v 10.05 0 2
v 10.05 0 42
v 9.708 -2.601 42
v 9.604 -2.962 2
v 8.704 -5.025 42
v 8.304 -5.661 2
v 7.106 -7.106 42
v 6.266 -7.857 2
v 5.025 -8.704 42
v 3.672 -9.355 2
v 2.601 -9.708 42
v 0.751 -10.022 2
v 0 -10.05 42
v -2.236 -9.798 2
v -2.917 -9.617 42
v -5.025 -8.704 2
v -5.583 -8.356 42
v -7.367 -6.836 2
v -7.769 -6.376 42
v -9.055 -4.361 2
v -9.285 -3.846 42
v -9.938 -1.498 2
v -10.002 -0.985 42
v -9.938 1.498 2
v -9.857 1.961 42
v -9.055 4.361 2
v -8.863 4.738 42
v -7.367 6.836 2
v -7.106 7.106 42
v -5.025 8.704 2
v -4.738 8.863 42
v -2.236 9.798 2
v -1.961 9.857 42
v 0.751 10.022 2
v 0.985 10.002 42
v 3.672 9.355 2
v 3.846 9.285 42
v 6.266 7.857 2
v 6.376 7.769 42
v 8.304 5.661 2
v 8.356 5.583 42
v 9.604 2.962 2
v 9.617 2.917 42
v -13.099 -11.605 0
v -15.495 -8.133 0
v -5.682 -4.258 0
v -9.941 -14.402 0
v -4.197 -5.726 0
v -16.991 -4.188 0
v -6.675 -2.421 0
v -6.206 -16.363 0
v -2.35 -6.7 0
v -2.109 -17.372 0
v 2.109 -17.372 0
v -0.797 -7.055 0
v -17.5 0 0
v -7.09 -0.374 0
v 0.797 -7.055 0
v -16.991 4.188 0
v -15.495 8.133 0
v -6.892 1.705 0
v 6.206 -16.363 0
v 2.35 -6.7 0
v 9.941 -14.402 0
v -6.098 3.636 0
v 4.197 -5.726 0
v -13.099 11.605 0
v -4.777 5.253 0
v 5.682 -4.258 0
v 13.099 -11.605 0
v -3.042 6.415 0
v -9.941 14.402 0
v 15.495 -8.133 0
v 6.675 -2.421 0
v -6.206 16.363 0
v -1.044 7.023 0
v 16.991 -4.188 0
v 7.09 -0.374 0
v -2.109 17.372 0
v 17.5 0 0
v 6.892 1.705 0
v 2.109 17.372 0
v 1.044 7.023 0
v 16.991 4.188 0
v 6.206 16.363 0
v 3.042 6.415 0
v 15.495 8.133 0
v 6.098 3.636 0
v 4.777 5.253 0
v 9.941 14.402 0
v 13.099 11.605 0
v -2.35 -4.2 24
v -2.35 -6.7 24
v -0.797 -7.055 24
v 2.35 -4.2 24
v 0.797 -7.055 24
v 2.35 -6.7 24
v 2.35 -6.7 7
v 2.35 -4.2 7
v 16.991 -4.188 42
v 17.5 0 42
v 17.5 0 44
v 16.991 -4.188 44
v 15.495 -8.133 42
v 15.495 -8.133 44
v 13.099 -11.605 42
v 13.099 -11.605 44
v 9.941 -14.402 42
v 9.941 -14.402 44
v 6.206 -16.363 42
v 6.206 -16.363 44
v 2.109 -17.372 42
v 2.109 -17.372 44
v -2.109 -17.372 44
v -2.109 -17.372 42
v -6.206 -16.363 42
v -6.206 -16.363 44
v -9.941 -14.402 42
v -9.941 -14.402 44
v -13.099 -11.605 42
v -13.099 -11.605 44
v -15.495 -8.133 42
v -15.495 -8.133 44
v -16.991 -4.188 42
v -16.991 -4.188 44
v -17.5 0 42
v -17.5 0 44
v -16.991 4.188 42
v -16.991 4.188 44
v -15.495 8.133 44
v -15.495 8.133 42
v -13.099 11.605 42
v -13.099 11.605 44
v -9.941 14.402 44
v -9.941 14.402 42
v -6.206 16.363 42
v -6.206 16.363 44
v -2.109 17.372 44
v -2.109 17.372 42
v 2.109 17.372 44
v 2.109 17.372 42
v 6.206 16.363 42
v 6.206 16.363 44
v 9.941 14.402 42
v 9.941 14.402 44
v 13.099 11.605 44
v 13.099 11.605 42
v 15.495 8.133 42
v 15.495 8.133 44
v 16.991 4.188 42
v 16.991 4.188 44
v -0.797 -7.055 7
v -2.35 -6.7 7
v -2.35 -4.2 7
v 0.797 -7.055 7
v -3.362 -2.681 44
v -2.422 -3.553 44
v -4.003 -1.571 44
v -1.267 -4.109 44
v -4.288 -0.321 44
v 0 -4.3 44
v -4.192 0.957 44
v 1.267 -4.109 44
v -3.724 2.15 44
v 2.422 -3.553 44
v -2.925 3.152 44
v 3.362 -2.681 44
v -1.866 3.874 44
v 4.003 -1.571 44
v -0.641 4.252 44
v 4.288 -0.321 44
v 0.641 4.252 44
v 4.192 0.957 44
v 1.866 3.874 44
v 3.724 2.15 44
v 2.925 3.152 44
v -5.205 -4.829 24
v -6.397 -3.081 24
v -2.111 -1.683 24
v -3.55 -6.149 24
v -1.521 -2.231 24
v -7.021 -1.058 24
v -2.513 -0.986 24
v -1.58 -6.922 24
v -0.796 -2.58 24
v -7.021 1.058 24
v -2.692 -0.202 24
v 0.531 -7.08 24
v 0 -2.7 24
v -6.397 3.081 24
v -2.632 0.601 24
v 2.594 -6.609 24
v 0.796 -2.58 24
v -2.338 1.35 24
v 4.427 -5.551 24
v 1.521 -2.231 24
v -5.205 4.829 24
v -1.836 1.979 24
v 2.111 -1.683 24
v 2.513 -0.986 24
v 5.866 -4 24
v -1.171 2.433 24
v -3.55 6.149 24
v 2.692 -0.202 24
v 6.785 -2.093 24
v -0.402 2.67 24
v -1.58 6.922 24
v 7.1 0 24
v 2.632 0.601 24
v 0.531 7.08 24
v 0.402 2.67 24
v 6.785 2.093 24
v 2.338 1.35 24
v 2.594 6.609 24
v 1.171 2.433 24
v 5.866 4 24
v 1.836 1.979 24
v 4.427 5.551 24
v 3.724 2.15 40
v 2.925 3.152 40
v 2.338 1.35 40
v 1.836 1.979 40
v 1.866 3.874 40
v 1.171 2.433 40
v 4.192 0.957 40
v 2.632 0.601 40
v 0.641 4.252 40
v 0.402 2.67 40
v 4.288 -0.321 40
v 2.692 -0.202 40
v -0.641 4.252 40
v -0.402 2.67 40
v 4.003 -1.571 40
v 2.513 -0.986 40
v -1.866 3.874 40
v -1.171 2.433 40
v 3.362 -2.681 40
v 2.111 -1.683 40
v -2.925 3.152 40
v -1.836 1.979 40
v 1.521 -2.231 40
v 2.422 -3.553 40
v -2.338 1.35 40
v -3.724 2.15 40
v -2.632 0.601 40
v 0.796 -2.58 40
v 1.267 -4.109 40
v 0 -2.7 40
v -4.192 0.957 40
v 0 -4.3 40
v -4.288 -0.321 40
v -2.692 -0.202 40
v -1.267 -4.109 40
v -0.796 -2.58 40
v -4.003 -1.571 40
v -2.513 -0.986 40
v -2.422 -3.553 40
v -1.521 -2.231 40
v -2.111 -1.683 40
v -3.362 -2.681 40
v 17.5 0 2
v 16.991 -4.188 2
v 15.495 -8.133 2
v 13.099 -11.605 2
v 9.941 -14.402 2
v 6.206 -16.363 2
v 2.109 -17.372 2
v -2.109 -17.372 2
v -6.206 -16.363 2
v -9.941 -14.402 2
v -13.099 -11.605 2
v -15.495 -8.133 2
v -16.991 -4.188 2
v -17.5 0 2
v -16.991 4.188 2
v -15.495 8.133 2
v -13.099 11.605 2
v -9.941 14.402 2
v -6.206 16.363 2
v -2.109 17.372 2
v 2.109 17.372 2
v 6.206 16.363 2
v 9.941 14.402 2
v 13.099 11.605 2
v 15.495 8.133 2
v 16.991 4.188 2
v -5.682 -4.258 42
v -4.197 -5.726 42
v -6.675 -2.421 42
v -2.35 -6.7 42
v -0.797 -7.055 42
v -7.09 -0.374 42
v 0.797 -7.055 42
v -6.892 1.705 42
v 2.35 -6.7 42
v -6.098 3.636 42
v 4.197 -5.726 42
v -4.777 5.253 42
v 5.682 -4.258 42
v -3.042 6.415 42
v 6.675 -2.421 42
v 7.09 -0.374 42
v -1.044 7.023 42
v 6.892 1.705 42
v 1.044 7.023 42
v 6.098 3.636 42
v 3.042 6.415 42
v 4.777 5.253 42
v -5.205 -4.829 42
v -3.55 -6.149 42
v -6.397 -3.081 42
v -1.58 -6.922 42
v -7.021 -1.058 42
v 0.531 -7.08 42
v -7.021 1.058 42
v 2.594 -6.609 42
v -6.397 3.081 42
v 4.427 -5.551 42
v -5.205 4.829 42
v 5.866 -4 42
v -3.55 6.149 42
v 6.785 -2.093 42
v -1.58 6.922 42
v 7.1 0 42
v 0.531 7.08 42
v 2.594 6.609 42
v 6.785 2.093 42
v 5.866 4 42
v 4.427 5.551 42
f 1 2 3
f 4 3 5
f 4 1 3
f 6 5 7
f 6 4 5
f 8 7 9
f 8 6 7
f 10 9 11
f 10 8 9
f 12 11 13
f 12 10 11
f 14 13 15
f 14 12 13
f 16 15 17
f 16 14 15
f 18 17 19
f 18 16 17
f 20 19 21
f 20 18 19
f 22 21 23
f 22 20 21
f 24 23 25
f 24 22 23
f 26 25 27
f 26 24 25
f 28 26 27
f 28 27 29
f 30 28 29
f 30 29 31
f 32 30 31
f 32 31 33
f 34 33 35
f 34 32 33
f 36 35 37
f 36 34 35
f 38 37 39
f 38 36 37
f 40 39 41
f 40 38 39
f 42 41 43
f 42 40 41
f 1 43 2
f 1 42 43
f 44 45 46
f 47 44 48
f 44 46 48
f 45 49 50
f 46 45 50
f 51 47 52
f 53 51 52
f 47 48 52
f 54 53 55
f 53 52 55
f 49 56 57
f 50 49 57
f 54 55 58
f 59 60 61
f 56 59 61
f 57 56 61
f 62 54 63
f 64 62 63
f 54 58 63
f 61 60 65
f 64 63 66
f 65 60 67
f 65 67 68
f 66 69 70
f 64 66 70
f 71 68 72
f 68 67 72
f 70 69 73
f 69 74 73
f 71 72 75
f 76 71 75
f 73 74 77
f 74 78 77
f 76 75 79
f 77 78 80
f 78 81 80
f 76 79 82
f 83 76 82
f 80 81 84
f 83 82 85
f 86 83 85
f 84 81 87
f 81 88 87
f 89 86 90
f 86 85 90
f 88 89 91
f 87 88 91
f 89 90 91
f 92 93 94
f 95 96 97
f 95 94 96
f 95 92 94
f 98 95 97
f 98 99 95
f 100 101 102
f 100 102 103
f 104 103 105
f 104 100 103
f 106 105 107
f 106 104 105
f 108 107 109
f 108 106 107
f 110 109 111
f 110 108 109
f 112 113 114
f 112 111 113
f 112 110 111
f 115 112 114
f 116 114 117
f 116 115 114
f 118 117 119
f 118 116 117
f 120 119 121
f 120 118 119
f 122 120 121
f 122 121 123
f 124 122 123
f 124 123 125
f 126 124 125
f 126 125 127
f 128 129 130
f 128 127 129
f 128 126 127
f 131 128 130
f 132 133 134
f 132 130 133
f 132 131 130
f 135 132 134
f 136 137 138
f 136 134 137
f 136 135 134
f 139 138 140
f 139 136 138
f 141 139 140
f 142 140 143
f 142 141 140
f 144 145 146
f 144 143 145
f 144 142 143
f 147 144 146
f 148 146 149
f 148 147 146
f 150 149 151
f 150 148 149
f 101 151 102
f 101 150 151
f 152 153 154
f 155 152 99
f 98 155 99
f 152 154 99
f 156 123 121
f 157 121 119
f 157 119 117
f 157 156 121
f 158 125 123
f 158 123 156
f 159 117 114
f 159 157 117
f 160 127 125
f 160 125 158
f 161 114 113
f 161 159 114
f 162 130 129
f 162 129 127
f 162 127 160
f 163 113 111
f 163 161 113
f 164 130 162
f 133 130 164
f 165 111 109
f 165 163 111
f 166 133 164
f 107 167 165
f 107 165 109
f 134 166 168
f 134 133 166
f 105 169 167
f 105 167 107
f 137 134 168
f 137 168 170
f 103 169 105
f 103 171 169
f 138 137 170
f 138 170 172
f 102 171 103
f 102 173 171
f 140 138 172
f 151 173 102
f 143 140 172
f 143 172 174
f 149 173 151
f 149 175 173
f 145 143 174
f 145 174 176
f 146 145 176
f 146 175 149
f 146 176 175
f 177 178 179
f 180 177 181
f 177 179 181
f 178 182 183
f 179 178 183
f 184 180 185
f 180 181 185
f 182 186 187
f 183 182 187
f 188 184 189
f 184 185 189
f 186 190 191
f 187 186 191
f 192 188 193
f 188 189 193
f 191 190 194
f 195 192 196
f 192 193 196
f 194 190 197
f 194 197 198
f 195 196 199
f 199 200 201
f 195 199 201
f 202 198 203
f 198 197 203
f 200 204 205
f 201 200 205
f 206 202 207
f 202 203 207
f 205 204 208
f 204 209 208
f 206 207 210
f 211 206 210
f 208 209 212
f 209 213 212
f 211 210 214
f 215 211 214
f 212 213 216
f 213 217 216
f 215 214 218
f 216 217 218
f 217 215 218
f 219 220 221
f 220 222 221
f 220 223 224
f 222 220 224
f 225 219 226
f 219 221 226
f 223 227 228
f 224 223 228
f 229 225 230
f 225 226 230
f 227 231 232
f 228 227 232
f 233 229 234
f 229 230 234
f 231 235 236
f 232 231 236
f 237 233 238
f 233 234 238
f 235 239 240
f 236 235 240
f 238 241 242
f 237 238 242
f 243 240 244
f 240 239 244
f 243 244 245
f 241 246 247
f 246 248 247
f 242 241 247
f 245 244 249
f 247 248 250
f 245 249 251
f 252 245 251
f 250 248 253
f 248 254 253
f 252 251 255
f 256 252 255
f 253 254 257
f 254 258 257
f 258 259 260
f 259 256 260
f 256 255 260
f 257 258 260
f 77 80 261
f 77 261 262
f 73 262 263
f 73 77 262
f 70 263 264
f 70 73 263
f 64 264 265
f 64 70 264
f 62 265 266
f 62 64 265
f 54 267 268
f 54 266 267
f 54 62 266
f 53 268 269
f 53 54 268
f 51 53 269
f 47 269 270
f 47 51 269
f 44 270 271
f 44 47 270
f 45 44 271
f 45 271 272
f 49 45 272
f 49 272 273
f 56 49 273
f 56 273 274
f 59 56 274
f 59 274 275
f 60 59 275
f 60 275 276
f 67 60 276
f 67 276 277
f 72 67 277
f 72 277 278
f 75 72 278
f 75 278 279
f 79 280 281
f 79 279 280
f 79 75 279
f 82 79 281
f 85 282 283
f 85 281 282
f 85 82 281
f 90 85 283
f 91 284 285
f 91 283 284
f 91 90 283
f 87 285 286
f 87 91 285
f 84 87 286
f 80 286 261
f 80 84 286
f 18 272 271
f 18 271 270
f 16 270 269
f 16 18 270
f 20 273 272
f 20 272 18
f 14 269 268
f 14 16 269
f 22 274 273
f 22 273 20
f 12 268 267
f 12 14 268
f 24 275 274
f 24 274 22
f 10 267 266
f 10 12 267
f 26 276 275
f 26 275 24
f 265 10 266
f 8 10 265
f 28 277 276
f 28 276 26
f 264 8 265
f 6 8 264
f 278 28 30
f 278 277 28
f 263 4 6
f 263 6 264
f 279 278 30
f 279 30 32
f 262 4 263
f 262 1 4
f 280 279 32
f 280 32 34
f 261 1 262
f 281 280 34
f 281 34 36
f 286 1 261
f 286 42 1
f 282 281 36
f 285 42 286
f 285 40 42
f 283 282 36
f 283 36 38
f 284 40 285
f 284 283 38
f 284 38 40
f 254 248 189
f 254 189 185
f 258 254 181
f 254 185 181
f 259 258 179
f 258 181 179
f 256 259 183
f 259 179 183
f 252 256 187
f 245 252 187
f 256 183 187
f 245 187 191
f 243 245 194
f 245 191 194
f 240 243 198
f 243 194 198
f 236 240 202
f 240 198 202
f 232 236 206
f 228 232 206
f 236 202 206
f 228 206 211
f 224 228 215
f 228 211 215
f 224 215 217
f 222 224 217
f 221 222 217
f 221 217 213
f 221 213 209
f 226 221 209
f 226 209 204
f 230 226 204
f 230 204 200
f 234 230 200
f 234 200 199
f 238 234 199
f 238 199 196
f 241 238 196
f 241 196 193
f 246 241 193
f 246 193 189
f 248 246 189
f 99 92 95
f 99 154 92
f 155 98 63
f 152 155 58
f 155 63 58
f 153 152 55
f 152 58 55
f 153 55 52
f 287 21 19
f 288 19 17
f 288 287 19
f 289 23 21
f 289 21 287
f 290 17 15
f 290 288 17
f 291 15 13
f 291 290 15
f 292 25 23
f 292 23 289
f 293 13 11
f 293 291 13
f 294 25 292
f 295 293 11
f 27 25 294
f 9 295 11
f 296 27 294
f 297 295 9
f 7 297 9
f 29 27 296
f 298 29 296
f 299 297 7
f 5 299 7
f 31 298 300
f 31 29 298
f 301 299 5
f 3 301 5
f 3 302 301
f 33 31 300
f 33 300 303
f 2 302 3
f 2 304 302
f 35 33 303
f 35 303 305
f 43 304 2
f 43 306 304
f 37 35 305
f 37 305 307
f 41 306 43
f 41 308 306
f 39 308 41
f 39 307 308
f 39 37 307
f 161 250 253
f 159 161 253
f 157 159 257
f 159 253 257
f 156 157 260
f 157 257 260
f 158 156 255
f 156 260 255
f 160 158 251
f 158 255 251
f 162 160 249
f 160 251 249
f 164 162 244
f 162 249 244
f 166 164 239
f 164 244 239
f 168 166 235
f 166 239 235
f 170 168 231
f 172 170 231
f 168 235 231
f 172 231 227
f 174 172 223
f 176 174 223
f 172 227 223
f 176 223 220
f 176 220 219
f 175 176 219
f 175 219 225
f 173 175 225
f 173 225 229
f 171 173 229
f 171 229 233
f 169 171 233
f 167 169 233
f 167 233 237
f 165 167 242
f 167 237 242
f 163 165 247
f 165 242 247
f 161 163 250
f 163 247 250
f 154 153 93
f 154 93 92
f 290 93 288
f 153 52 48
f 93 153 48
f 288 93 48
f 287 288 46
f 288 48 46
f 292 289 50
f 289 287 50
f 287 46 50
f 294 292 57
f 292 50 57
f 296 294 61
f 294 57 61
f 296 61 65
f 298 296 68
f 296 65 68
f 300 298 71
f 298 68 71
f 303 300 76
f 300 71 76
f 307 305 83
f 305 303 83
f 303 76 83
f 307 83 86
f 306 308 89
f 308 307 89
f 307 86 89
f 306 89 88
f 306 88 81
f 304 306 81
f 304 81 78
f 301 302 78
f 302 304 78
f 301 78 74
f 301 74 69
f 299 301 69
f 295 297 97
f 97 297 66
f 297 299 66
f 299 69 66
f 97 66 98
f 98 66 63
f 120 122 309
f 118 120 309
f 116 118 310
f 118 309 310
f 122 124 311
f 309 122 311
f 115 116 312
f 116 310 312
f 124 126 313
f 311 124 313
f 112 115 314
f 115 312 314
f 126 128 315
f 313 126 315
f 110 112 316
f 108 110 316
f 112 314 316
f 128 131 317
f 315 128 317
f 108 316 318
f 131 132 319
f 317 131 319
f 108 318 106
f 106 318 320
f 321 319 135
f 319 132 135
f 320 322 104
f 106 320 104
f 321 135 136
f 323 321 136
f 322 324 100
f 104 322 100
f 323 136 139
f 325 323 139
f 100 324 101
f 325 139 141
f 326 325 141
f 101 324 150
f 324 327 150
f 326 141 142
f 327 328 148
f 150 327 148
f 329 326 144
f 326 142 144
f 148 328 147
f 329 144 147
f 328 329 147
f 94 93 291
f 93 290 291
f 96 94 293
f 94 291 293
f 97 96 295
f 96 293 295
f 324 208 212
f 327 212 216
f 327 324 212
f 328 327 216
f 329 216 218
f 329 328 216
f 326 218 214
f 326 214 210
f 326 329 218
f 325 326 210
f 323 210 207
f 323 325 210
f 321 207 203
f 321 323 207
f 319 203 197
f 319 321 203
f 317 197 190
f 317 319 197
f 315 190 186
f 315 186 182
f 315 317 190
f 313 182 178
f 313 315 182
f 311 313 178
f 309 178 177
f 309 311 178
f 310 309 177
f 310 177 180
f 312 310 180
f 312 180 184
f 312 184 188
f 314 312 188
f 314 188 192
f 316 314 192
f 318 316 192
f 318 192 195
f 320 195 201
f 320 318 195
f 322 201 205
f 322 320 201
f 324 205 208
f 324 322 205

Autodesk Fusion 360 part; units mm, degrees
sketch "Sketch1" plane through (0, 0, 0) normal (0, 0, 1) x (1, 0, 0)
  circle A0 centre (0, 0) radius 10.05
  line L0 (2.35, -4.2) -> (2.35, -9.4)
  line L1 (-2.35, -4.2) -> (2.35, -4.2)
  line L2 (-2.35, -4.2) -> (2.35, -9.4) construction
  line L3 (2.35, -9.4) -> (-2.35, -9.4)
  line L4 (2.35, -4.2) -> (-2.35, -9.4) construction
  line L5 (-2.35, -9.4) -> (-2.35, -4.2)
  circle A1 centre (0, 0) radius 7.1
  circle A2 centre (0, 0) radius 17.5
  line L6 (0, 0) -> (0, -12)
  point P0 (0, -6.8)
  dimension "d1" = 20.1
  dimension "d2" = 4.7
  dimension "d3" = 5.2
  dimension "d4" = 14.2
  dimension "d5" = 2.9
  dimension "d10" = 35
extrude "Extrude1" add sketch "Sketch1" along normal blind 42 contours L3 L5 A1 L6 | L0 L3 A1 L6 | A0 | L0 L1 A1 L6 | L1 L5 A1 L6 makes body 1
extrude "Extrude2" add sketch "Sketch1" along normal blind 2 contours A2 bodies 1
extrude "Extrude3" add sketch "Sketch1" along normal blind 2 from surface at 42 separate body contours L3 L5 A1 L6 | L0 L3 A1 L6 | A0 | L0 L1 A1 L6 | L1 L5 A1 L6 | A2 makes body 2
extrude "Extrude4" add sketch "Sketch1" against normal blind 20 from surface at 44 separate body contours L0 L1 A1 L6 | L1 L5 A1 L6 | L0 L1 L5 A1 makes body 3
combine "Combine1" operation add target body 2 tool bodies 3
move_face "OffsetFaces1" [suppressed]
sketch "Sketch2" plane through (0, 0, 44) normal (0, 0, 1) x (-1, 0, 0)
  circle A0 centre (0, 0) radius 17.5
  circle A1 centre (0, 0) radius 3
extrude "Extrude5" cut sketch "Sketch1" against normal blind 18 from surface at 42 contours L0 L1 A1 L6 | L1 L5 A1 L6 bodies 1
hole "Hole1" at (0, 0, 44) direction (0, 0, -1) diameter 5.4 depth 65 tip angle 118 counterbore diameter 8.6 counterbore depth 4 bodies 2
extrude "Extrude6" cut sketch "Sketch1" along normal blind 7 contours L0 L1 A1 L6 | L1 L5 A1 L6 bodies 1
